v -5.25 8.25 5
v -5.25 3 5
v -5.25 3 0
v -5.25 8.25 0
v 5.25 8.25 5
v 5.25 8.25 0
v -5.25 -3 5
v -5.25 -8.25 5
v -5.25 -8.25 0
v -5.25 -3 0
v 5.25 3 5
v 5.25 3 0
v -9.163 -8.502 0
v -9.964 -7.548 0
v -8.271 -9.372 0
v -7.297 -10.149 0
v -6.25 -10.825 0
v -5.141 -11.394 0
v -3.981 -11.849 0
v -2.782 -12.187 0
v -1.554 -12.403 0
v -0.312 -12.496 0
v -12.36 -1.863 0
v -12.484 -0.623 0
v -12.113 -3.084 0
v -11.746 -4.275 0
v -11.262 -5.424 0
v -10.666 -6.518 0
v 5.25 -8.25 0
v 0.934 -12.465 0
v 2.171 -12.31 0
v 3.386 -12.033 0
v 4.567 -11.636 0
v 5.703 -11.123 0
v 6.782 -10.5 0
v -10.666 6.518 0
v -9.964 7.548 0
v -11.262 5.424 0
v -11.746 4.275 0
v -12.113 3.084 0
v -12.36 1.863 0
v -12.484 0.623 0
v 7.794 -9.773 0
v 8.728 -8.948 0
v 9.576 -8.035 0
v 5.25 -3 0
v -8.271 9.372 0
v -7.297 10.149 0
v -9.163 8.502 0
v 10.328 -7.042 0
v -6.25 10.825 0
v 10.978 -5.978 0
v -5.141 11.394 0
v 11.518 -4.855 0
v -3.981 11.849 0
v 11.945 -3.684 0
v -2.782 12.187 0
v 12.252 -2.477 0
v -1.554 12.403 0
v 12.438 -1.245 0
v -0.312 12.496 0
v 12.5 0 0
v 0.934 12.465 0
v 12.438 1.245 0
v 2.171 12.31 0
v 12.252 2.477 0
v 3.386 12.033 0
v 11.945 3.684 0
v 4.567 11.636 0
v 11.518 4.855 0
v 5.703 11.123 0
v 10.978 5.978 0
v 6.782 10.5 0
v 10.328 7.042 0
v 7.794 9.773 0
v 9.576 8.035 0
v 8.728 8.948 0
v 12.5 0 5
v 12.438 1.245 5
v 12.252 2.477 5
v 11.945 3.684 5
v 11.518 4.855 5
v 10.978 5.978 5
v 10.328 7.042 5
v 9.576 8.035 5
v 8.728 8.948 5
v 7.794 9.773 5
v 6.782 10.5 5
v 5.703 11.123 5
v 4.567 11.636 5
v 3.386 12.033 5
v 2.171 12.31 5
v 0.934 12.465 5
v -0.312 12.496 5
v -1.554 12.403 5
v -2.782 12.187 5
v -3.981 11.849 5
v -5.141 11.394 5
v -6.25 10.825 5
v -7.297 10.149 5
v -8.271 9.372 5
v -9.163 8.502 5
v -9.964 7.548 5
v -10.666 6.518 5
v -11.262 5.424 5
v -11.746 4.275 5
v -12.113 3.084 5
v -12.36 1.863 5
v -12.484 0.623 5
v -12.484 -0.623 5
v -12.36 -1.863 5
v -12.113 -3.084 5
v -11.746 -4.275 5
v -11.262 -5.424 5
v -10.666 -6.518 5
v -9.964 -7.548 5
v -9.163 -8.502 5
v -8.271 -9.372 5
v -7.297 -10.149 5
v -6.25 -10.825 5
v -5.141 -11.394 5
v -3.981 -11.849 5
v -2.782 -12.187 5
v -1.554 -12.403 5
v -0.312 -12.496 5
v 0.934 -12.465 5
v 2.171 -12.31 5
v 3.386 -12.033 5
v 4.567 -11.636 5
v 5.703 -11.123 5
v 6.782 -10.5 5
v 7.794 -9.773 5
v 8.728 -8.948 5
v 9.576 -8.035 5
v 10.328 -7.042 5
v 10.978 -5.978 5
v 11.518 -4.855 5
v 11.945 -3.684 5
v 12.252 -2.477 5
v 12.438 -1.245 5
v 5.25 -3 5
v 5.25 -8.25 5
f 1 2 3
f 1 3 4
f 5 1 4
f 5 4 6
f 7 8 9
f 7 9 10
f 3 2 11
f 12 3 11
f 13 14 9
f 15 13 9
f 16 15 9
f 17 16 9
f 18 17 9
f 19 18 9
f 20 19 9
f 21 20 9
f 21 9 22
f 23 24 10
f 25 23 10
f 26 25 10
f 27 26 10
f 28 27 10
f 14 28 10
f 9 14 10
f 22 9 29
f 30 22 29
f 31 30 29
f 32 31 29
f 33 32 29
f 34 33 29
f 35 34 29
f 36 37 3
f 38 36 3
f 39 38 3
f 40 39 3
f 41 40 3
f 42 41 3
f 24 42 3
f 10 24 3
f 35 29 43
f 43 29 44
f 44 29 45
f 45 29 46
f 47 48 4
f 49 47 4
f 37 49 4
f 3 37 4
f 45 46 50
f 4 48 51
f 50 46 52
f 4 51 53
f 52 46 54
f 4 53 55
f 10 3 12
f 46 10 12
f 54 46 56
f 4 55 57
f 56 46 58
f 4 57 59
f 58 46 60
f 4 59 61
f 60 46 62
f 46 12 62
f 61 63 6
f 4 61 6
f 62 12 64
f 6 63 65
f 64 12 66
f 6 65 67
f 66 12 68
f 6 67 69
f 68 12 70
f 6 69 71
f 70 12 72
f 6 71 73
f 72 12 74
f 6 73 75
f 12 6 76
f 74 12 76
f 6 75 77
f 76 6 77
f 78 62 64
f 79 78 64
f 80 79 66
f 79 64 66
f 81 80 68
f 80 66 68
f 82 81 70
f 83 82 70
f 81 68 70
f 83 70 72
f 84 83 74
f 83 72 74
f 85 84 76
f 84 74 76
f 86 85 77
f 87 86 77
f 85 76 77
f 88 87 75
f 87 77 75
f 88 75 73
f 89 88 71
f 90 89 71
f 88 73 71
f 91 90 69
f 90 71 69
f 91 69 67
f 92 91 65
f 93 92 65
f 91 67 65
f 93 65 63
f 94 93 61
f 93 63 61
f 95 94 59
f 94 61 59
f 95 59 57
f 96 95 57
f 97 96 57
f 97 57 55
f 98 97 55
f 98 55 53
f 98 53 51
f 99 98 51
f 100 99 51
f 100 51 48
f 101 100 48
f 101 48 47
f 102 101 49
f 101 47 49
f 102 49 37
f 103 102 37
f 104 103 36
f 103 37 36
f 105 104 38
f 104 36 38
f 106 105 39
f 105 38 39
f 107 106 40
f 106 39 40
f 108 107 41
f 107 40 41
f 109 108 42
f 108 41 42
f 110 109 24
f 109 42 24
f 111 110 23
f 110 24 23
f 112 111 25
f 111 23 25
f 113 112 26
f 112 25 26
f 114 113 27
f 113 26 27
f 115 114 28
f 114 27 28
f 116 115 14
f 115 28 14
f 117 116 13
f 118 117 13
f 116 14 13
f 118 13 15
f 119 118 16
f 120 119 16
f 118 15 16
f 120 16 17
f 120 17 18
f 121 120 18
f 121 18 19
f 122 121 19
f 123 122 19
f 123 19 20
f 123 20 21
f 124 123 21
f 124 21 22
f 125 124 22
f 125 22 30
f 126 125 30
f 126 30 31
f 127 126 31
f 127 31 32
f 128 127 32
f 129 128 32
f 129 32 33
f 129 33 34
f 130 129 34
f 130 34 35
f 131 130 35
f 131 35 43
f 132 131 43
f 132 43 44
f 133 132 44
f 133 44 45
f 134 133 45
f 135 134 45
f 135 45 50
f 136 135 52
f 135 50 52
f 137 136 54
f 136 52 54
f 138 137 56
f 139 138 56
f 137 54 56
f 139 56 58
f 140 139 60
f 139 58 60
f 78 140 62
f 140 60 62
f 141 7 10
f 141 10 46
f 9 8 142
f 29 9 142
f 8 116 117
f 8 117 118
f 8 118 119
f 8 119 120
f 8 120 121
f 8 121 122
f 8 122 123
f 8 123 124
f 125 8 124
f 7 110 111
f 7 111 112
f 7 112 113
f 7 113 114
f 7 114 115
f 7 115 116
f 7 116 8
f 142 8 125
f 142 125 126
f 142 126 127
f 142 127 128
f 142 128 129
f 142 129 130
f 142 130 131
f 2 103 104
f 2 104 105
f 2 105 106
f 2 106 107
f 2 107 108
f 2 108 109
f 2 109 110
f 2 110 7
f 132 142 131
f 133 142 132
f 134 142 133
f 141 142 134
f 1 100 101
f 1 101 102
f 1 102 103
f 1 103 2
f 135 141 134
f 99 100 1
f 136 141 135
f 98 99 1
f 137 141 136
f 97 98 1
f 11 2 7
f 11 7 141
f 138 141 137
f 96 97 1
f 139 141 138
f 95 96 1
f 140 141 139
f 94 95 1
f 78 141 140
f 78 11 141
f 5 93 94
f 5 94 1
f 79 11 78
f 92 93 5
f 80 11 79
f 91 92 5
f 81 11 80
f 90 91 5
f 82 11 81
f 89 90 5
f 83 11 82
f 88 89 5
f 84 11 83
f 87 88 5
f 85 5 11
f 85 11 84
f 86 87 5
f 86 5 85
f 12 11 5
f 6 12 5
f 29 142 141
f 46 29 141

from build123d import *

# Parameters (mm, degrees)
F0_R     = 12.5
F1_DEPTH = 5
F2_W     = 10.5
F2_H     = 5.25
F3_DEPTH = 5


with BuildPart() as f1:
    # F0 (on Top) → F1 (new body)
    with BuildSketch(Plane.XY):
        Circle(F0_R)
    extrude(amount=F1_DEPTH)


with BuildPart() as f3:
    # F2 (on face) → F3 (new body)
    with BuildSketch(Plane.XY.offset(5)):
        with Locations((0, 5.625)):
            Rectangle(F2_W, F2_H)
        with Locations((0, -5.625)):
            Rectangle(F2_W, F2_H)
    extrude(amount=-F3_DEPTH)


with BuildPart() as f1_1:
    add(f1.part)

    # F4: cut F3
    add(f3.part, mode=Mode.SUBTRACT)


solid = f1_1.part
